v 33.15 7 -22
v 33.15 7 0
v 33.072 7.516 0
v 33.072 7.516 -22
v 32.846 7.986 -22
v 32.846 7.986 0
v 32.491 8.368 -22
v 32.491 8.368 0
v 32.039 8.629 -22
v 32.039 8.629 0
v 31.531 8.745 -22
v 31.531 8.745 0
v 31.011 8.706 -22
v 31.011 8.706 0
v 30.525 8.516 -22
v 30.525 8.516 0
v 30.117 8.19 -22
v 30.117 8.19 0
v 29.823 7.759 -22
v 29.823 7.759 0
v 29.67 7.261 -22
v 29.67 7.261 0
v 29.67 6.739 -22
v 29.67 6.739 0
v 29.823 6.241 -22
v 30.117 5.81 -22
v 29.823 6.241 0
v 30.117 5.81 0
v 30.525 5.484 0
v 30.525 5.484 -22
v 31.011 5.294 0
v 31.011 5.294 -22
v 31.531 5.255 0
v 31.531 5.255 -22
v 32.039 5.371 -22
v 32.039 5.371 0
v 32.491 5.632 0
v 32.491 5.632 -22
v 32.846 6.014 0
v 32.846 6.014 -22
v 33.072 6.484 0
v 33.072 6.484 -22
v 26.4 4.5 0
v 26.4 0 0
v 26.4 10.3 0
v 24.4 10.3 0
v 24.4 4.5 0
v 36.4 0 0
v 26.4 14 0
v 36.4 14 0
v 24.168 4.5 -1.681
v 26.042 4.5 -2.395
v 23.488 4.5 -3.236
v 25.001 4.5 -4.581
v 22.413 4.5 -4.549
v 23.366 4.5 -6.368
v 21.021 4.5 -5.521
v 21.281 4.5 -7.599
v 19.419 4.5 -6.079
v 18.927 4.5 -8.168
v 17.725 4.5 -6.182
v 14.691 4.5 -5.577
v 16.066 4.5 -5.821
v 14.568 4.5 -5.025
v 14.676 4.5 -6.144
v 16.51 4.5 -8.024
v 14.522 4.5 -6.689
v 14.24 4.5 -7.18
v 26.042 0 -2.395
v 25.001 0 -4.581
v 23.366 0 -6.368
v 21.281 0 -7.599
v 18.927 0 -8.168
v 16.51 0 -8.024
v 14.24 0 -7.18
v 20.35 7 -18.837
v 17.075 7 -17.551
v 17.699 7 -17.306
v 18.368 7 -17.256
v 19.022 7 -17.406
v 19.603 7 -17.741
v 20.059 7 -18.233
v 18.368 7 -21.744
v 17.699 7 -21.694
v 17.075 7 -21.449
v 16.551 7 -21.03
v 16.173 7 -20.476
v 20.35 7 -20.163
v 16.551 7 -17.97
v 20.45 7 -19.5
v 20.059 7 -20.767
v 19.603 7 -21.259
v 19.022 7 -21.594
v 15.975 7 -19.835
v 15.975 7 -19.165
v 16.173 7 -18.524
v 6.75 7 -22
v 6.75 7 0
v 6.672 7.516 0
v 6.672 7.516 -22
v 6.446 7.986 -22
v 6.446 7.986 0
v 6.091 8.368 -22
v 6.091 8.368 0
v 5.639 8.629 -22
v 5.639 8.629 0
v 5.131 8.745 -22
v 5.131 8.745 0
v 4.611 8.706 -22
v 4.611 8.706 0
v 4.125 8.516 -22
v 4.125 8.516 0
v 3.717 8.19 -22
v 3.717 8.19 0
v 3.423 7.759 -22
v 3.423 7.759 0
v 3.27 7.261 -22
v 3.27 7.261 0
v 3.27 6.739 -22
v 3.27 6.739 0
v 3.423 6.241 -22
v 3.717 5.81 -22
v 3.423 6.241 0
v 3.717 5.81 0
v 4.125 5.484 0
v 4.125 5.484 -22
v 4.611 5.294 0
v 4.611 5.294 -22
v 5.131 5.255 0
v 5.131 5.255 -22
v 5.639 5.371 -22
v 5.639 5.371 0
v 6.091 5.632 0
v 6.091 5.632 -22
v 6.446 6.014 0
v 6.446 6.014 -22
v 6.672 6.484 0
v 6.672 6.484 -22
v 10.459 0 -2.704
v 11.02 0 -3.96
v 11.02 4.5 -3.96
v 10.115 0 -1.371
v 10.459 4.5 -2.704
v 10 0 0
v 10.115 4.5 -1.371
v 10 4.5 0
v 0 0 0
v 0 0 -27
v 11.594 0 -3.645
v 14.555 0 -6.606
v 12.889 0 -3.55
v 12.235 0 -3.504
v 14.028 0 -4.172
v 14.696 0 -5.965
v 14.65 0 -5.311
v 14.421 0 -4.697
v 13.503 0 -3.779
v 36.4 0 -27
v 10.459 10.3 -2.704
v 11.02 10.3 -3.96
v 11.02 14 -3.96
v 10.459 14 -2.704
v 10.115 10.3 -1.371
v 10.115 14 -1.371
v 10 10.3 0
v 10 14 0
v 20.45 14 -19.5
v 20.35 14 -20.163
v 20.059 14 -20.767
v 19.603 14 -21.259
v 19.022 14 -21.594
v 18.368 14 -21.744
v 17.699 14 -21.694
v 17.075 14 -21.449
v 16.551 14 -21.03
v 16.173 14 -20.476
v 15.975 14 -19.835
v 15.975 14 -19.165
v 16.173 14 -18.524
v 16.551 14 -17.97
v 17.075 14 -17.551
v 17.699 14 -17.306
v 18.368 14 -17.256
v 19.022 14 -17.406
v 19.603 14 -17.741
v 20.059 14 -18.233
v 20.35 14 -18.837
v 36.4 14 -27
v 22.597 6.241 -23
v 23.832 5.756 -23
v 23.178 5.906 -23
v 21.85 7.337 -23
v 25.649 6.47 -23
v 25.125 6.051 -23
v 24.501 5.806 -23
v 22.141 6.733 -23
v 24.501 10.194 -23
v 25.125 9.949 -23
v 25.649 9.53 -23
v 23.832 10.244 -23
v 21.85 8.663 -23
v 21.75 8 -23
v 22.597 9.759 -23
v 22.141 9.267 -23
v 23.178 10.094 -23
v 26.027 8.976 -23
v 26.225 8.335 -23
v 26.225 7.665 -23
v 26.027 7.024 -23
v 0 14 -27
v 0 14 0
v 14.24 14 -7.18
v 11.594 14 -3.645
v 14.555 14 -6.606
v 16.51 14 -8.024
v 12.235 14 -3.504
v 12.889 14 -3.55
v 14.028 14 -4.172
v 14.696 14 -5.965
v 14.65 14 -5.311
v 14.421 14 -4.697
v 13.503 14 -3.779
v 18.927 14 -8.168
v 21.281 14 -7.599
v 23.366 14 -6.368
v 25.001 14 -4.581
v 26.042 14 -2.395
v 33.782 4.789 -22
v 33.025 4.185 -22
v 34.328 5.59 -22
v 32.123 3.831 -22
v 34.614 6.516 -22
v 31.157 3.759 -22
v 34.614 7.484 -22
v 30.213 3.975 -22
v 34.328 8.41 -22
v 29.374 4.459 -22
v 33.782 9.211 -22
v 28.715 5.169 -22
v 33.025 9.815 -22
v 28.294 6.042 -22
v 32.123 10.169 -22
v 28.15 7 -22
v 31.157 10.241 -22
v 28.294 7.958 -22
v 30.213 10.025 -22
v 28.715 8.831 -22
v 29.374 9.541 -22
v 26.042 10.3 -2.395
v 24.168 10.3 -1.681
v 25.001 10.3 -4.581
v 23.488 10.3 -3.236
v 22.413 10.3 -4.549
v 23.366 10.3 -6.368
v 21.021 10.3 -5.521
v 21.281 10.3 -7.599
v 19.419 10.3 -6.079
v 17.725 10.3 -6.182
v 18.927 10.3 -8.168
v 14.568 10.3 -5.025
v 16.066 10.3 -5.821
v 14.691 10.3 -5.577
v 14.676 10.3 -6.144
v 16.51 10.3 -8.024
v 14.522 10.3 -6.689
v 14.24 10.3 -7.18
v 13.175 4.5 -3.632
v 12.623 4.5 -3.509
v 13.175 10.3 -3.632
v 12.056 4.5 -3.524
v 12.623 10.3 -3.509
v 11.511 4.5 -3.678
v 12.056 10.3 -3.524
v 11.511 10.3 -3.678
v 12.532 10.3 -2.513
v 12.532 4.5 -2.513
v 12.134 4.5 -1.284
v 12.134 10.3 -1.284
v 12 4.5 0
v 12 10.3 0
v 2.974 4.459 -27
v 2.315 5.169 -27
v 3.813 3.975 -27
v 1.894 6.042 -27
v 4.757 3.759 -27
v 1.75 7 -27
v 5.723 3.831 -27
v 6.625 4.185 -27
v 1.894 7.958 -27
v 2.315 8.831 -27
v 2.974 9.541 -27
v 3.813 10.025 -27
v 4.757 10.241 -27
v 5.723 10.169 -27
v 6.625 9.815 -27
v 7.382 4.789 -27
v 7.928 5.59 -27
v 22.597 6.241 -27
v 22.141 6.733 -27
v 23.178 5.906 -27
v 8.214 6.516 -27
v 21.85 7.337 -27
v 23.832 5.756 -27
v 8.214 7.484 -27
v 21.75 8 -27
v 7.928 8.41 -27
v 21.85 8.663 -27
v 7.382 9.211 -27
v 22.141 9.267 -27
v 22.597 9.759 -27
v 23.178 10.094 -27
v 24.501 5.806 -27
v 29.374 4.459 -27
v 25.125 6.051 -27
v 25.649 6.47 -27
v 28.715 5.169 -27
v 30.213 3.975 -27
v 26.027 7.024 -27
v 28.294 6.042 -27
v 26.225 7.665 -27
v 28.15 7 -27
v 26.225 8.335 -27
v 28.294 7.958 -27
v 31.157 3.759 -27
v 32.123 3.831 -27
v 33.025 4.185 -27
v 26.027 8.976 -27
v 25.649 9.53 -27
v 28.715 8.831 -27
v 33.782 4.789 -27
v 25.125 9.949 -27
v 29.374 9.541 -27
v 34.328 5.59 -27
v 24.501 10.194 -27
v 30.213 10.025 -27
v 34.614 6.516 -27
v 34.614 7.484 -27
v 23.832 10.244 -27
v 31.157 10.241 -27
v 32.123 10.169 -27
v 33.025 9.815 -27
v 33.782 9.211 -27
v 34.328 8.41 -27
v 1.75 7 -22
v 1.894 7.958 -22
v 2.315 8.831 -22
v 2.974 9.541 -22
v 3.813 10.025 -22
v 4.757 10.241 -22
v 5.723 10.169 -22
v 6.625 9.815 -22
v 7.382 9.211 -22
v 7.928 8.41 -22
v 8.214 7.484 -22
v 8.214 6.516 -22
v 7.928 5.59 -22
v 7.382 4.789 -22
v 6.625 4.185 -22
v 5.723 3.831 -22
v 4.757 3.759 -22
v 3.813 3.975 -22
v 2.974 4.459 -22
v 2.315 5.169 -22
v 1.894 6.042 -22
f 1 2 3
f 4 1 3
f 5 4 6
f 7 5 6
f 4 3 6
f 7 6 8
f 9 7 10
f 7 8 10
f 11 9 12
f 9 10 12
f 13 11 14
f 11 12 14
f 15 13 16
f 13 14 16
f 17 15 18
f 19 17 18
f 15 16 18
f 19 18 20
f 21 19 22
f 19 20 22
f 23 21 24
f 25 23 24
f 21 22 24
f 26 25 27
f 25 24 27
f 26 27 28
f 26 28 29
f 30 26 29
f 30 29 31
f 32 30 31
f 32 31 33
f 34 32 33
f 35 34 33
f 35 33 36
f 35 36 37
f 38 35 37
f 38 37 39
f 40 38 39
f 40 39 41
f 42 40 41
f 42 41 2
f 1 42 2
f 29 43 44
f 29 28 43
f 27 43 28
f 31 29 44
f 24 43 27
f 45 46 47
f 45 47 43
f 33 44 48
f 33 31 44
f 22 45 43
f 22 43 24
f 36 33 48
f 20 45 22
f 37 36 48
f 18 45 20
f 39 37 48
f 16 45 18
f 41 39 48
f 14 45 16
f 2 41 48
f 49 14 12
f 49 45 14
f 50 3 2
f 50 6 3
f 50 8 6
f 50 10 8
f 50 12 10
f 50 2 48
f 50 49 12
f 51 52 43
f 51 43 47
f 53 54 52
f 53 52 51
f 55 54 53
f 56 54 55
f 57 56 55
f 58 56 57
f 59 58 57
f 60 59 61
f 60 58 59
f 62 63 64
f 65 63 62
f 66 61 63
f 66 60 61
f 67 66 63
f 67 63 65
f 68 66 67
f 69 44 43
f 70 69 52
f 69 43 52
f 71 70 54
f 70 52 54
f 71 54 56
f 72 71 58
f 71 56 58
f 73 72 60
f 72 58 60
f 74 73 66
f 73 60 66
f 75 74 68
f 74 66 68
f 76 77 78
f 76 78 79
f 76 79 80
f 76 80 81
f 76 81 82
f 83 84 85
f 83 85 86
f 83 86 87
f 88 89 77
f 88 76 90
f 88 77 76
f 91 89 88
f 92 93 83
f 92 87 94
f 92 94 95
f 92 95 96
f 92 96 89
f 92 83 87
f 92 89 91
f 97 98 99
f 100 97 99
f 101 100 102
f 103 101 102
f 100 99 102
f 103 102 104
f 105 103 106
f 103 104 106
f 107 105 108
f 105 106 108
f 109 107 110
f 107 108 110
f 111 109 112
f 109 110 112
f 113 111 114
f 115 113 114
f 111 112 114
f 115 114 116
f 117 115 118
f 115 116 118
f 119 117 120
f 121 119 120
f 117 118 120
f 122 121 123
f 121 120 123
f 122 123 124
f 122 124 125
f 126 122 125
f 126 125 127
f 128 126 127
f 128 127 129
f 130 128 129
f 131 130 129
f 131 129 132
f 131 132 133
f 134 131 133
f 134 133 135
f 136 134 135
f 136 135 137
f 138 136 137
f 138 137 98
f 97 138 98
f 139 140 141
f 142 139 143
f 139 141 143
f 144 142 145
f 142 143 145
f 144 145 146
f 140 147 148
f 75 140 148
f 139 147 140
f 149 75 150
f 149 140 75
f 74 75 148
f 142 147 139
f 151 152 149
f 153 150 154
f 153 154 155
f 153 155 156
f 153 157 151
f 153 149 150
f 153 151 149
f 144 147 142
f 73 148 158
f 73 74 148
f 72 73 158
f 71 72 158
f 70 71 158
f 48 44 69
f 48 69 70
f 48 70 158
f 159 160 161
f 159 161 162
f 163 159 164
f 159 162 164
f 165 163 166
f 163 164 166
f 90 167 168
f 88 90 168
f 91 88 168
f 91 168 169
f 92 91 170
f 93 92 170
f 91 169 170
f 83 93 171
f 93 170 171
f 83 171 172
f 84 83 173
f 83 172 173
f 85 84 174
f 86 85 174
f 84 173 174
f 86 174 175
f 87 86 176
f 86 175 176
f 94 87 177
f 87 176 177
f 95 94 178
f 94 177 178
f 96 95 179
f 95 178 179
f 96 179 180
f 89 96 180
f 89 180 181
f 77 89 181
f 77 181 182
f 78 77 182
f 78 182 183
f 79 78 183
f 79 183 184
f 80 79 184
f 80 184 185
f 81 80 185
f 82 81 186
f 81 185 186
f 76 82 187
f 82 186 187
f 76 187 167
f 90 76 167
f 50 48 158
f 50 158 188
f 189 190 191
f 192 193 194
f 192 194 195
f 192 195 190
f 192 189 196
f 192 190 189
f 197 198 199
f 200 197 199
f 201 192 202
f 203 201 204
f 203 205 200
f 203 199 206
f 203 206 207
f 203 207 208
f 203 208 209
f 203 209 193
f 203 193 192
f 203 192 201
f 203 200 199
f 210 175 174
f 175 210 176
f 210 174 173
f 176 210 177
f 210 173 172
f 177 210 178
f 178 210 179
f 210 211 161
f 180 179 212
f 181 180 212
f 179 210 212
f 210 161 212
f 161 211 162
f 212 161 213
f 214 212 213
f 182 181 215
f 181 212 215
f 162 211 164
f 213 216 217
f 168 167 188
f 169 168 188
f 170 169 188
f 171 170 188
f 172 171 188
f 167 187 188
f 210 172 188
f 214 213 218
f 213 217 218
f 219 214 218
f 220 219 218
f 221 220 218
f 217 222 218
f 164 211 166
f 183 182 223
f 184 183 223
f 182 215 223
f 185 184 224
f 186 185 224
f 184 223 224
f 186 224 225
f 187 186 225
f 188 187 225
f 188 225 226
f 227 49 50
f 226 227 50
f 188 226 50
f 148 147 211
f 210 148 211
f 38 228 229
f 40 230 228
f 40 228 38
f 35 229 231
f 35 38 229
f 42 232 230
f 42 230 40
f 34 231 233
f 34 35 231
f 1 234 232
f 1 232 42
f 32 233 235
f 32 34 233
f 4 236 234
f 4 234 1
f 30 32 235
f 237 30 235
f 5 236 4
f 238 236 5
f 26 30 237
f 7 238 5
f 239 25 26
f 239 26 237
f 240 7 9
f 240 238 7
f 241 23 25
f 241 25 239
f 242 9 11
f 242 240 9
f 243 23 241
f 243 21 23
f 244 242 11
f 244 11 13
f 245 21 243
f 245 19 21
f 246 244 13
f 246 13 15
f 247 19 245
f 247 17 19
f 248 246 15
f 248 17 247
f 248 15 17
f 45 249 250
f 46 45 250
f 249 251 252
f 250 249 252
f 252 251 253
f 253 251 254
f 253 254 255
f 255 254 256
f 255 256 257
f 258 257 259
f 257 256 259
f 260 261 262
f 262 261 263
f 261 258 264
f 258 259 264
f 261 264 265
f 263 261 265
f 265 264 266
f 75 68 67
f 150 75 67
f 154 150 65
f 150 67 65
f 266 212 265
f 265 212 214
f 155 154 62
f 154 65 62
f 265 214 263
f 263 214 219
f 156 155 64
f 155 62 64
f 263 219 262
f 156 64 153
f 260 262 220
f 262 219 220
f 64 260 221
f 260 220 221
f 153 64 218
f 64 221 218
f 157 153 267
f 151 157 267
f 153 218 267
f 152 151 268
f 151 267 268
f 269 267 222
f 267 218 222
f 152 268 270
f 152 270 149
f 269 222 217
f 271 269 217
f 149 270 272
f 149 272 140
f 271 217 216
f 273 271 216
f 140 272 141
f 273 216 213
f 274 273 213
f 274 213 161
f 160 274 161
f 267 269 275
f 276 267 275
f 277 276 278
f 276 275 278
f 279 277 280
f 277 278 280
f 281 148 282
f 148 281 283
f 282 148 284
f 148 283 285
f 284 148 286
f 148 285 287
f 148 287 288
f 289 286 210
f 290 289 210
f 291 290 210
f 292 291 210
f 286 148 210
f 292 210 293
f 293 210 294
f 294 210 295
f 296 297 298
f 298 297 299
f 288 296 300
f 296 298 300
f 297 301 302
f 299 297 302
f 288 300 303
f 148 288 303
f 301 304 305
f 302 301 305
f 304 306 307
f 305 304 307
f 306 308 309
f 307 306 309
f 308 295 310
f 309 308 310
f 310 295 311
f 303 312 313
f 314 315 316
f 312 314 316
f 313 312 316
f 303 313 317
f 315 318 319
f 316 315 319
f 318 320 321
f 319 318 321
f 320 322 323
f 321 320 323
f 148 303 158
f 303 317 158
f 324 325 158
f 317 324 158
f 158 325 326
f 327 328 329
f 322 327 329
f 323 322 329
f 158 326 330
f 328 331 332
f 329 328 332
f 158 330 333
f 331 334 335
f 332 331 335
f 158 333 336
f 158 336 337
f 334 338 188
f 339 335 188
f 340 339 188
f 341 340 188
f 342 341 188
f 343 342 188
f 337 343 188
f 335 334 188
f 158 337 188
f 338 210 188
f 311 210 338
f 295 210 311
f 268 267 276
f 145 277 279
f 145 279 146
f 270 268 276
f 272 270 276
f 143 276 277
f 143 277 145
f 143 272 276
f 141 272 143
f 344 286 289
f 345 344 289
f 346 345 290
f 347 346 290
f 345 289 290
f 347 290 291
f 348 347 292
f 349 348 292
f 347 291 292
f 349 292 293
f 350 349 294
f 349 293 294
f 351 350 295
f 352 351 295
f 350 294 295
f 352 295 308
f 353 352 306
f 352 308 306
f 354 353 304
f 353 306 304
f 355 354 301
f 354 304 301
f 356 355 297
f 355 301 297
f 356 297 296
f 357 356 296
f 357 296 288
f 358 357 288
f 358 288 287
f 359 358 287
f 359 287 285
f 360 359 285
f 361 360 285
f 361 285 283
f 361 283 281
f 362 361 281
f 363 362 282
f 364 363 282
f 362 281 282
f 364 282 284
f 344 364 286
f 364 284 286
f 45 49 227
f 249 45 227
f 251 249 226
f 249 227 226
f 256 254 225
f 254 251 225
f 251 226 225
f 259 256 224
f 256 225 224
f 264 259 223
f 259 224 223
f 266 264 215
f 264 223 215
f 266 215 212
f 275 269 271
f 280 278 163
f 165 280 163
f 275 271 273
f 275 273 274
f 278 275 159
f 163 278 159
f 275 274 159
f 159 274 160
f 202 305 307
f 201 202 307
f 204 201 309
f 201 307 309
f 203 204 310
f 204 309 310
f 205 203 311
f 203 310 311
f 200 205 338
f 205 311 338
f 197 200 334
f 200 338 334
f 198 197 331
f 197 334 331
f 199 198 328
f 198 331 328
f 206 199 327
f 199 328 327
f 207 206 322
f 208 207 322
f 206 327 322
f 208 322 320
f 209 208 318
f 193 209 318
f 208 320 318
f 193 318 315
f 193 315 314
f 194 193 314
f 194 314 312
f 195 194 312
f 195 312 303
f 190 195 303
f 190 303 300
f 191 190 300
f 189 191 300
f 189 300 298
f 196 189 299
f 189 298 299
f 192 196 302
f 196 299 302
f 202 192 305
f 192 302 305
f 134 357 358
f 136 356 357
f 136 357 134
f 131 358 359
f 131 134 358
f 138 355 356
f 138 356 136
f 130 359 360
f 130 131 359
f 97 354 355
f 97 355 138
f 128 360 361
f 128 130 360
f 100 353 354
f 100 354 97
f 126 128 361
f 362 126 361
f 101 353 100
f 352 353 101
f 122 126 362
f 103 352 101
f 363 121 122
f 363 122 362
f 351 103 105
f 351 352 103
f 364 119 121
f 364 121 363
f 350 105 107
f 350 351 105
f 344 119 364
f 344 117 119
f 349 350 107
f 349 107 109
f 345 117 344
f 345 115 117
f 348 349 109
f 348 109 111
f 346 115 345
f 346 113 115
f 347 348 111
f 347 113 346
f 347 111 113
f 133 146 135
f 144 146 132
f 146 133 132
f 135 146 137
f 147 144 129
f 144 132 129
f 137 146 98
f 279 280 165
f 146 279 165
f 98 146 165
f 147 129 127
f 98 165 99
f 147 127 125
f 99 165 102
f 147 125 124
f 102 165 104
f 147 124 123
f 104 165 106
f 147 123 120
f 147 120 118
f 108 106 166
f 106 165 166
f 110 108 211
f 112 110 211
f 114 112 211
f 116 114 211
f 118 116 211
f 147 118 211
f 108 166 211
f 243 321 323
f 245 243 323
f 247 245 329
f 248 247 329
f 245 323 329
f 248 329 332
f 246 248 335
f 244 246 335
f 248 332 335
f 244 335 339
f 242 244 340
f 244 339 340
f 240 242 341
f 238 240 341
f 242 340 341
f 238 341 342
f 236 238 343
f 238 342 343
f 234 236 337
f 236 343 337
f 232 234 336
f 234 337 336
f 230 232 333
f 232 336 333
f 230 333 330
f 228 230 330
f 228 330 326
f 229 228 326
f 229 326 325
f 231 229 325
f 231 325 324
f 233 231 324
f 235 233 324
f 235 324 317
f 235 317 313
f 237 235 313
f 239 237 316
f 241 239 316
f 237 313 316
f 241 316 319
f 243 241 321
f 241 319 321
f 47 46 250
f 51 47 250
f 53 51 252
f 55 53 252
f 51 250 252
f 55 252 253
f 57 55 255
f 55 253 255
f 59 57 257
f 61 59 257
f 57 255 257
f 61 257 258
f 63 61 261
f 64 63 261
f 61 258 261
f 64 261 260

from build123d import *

# Parameters (mm, degrees)
SKETCH1_W                          = 36.4
SKETCH1_H                          = 14
BOSS_EXTRUDE1_DEPTH                = 27
CUT_EXTRUDE1_DEPTH                 = 14
BOSS_EXTRUDE2_START                = -3.7
BOSS_EXTRUDE2_DEPTH                = 5.8
SKETCH3_R                          = 1.75
CUT_EXTRUDE2_DEPTH                 = 27
SKETCH5_R                          = 3.25
CUT_EXTRUDE3_DEPTH                 = 5
SKETCH6_R                          = 2.25
HEAT_SET_INSERT_FOR_EXTRUDER_DEPTH = 7
SKETCH8_R                          = 2.25
CUT_EXTRUDE4_DEPTH                 = 4


with BuildPart() as part:
    # Sketch1 → Boss-Extrude1 (new body)
    with BuildSketch(Plane.XY):
        with Locations((18.2, 7)):
            Rectangle(SKETCH1_W, SKETCH1_H)
    extrude(amount=-BOSS_EXTRUDE1_DEPTH)

    # Sketch2 → Cut-Extrude1 (cut)
    with BuildSketch(Plane(origin=(0, 14, 0), x_dir=(1, 0, 0), z_dir=(0, 1, 0))):
        with BuildLine():
            ThreePointArc((11.019537046, 3.959918151), (10.258973737, 2.044529747), (10, 0))
            Line((10, 0), (26.4, 0))
            ThreePointArc((26.4, 0), (22.369452672, 7.060854369), (14.240081849, 7.180462954))
            ThreePointArc((14.240081849, 7.180462954), (14.028069991, 4.171930009), (11.019537046, 3.959918151))
        make_face()
    extrude(amount=-CUT_EXTRUDE1_DEPTH, mode=Mode.SUBTRACT)

    # Sketch4 → Boss-Extrude2 (add)
    with BuildSketch(Plane(origin=(0, 14, 0), x_dir=(1, 0, 0), z_dir=(0, 1, 0)).offset(BOSS_EXTRUDE2_START)):
        with BuildLine():
            Line((12, 0), (10, 0))
            ThreePointArc((10, 0), (18.2, 8.2), (26.4, 0))
            Line((26.4, 0), (24.4, 0))
            ThreePointArc((24.4, 0), (18.2, 6.2), (12, 0))
        make_face()
    extrude(amount=-BOSS_EXTRUDE2_DEPTH)

    # Sketch3 → Cut-Extrude2 (cut)
    with BuildSketch(Plane.XY):
        with Locations((5, 7)):
            Circle(SKETCH3_R)
        with Locations((31.4, 7)):
            Circle(SKETCH3_R)
    extrude(amount=-CUT_EXTRUDE2_DEPTH, mode=Mode.SUBTRACT)

    # Sketch5 → Cut-Extrude3 (cut)
    with BuildSketch(Plane(origin=(0, 0, -27), x_dir=(-1, 0, 0), z_dir=(0, 0, -1))):
        with Locations((-31.4, 7)):
            Circle(SKETCH5_R)
        with Locations((-5, 7)):
            Circle(SKETCH5_R)
    extrude(amount=-CUT_EXTRUDE3_DEPTH, mode=Mode.SUBTRACT)

    # Sketch6 → heat set insert for extruder (cut)
    with BuildSketch(Plane(origin=(0, 14, 0), x_dir=(1, 0, 0), z_dir=(0, 1, 0))):
        with Locations((18.2, 19.5)):
            Circle(SKETCH6_R)
    extrude(amount=-HEAT_SET_INSERT_FOR_EXTRUDER_DEPTH, mode=Mode.SUBTRACT)

    # Sketch8 → Cut-Extrude4 (cut)
    with BuildSketch(Plane(origin=(0, 0, -27), x_dir=(-1, 0, 0), z_dir=(0, 0, -1))):
        with Locations((-24, 8)):
            Circle(SKETCH8_R)
    extrude(amount=-CUT_EXTRUDE4_DEPTH, mode=Mode.SUBTRACT)


solid = part.part
